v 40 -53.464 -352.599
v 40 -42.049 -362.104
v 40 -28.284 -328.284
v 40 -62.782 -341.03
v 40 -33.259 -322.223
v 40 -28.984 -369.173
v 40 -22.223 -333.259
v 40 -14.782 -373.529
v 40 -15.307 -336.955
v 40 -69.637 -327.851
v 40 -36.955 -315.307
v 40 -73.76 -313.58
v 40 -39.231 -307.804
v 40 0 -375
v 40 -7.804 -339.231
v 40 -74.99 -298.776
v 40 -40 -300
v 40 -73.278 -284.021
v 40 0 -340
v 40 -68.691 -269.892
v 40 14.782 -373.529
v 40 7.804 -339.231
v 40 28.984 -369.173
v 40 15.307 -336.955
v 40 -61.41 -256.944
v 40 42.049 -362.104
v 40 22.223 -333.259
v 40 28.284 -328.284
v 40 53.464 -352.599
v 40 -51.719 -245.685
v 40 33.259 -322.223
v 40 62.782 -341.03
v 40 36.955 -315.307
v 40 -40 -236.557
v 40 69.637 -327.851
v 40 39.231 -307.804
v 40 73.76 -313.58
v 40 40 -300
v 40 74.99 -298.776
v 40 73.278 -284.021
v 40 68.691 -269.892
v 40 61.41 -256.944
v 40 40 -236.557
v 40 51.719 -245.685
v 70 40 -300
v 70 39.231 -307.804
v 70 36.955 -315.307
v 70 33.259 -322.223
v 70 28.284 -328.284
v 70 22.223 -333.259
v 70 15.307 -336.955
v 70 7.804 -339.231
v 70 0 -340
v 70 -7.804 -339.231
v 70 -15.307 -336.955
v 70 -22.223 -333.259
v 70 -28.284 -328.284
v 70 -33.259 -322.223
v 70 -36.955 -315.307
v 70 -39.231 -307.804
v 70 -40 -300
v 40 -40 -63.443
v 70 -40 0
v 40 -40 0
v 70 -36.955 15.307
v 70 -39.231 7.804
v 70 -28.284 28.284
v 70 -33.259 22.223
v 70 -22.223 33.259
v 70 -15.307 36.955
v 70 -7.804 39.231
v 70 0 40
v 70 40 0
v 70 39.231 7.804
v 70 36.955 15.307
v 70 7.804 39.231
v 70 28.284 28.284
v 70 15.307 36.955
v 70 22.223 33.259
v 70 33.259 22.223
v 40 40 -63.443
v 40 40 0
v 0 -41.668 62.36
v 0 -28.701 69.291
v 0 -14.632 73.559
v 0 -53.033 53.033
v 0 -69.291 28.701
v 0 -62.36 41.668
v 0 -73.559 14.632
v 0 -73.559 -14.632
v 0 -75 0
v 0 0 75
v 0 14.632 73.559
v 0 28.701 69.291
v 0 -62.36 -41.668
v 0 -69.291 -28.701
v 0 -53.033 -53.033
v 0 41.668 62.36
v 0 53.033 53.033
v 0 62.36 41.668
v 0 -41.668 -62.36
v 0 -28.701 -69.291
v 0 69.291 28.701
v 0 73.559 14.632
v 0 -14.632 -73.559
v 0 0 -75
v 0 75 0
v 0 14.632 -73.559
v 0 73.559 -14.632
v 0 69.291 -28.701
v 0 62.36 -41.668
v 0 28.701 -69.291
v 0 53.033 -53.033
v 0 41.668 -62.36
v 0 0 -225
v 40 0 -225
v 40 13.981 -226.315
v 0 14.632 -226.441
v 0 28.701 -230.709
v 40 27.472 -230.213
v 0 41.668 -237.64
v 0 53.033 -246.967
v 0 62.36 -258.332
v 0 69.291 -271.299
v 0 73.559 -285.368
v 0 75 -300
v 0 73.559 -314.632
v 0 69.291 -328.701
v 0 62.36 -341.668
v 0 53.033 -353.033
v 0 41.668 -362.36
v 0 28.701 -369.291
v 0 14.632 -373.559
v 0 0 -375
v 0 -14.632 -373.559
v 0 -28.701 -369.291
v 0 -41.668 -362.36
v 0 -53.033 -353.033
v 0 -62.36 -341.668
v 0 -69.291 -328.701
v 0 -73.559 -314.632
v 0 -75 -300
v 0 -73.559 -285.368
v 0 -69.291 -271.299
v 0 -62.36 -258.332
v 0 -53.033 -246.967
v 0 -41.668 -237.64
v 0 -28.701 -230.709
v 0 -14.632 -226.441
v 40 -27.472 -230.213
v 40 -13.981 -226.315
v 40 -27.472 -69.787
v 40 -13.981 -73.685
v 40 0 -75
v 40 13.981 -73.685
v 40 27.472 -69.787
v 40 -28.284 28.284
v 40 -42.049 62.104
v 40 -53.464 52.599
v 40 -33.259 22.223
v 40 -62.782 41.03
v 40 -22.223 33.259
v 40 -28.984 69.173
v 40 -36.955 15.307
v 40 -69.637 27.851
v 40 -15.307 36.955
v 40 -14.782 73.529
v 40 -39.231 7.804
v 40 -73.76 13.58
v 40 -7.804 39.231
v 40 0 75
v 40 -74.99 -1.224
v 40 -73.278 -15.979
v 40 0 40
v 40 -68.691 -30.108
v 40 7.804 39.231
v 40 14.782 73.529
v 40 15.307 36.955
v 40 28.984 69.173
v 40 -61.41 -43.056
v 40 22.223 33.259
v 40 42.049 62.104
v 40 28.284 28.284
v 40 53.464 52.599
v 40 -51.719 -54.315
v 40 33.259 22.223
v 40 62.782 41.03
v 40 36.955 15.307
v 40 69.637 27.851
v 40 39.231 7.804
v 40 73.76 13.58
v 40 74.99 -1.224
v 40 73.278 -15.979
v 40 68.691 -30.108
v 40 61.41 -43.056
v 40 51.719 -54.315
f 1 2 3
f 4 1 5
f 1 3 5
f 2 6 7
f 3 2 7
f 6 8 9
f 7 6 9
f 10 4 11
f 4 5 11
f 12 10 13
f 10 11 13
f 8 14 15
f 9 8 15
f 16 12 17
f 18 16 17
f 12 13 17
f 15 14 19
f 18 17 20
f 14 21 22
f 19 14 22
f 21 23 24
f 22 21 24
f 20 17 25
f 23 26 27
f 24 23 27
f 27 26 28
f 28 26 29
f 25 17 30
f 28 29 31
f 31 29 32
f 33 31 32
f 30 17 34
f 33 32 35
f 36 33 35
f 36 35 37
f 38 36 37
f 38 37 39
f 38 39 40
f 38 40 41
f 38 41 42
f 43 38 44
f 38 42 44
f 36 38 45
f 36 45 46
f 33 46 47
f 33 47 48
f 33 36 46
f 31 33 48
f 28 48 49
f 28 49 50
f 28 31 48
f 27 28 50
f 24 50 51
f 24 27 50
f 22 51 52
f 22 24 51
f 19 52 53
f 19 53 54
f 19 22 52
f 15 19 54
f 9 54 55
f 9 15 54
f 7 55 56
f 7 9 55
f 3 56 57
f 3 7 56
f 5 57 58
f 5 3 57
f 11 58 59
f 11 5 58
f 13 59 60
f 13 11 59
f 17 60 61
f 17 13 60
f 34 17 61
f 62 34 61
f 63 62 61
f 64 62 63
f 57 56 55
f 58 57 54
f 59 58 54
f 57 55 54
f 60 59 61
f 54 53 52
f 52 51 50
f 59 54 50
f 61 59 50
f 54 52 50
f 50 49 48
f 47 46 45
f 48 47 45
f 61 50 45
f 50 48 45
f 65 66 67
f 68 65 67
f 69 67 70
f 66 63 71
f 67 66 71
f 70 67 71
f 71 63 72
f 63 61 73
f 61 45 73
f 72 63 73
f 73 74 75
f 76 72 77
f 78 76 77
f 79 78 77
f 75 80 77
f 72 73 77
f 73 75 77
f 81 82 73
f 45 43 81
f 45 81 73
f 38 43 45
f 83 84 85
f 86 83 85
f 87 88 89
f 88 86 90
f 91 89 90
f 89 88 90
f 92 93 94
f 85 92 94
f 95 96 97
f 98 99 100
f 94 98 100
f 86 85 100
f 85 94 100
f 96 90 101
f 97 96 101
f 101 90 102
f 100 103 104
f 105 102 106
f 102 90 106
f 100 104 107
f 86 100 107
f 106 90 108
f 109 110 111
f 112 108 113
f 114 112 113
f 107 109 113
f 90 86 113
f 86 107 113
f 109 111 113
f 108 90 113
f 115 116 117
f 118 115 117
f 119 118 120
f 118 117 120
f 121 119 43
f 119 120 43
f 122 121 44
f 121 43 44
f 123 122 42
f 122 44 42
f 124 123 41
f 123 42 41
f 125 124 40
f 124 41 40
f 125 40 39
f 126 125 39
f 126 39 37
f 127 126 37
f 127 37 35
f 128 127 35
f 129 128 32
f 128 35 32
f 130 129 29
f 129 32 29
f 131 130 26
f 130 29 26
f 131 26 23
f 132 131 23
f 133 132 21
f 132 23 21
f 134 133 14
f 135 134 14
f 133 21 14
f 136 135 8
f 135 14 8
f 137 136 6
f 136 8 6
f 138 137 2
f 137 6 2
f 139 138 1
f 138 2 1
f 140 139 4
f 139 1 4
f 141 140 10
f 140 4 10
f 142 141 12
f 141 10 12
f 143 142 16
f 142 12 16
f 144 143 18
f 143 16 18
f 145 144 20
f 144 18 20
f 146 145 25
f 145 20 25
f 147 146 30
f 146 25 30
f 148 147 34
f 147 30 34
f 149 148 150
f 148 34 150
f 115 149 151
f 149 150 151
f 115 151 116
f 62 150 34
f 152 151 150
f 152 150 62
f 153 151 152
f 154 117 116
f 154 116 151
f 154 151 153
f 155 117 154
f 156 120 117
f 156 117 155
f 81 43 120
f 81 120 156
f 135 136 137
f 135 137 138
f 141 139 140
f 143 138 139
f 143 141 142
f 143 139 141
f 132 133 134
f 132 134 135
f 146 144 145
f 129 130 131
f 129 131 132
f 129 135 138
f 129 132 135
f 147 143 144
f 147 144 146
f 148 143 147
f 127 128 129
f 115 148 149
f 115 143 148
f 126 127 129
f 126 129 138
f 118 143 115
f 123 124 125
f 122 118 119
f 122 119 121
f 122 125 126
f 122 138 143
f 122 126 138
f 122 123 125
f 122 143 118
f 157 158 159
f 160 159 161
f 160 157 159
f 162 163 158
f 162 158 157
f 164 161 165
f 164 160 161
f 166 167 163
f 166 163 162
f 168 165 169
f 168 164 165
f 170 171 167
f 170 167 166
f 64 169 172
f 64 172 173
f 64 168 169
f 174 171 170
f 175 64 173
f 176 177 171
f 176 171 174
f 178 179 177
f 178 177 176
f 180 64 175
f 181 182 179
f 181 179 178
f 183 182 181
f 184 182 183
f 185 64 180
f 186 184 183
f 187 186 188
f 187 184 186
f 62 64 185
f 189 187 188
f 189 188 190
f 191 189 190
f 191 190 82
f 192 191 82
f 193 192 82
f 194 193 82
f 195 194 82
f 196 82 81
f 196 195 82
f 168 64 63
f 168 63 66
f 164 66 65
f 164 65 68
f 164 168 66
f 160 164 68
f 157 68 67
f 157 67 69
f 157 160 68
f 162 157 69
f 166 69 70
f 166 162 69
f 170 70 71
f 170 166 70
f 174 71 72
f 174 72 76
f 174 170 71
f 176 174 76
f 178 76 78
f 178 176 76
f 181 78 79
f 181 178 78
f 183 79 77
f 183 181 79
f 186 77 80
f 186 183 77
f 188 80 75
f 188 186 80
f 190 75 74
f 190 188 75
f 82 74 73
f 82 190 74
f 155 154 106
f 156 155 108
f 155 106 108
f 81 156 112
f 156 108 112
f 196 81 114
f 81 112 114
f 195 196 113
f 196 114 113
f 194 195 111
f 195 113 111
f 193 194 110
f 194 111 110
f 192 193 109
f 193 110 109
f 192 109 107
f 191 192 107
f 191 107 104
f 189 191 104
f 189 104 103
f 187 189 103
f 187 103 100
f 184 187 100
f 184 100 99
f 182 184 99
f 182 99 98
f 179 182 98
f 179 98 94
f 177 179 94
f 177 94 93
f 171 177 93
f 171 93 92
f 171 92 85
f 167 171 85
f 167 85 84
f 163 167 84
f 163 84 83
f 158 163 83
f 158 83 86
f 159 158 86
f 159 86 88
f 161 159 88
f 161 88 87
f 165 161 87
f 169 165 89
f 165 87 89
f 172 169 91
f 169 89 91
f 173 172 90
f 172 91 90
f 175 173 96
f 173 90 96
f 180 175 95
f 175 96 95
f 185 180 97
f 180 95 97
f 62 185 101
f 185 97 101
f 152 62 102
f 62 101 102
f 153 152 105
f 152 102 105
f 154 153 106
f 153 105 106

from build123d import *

# Parameters (mm, degrees)
SKETCH1_R           = 75
BOSS_EXTRUDE1_DEPTH = 40
BOSS_EXTRUDE2_DEPTH = 30
SKETCH3_R           = 75
BOSS_EXTRUDE3_DEPTH = 40


with BuildPart() as part:
    # Sketch1 → Boss-Extrude1 (new body)
    with BuildSketch(Plane(origin=(0, 0, 0), x_dir=(0, 0, -1), z_dir=(1, 0, 0))):
        Circle(SKETCH1_R)
    extrude(amount=BOSS_EXTRUDE1_DEPTH)

    # Sketch2 → Boss-Extrude2 (add)
    with BuildSketch(Plane(origin=(40, 0, 0), x_dir=(0, 0, -1), z_dir=(1, 0, 0))):
        with BuildLine():
            Line((0, 40), (300, 40))
            ThreePointArc((300, 40), (340, 0), (300, -40))
            Line((300, -40), (0, -40))
            ThreePointArc((0, -40), (-40, 0), (0, 40))
        make_face()
    extrude(amount=BOSS_EXTRUDE2_DEPTH)

    # Sketch3 → Boss-Extrude3 (add)
    with BuildSketch(Plane.ZY.offset(-40)):
        with Locations((-300, 0)):
            Circle(SKETCH3_R)
    extrude(amount=BOSS_EXTRUDE3_DEPTH)


solid = part.part
